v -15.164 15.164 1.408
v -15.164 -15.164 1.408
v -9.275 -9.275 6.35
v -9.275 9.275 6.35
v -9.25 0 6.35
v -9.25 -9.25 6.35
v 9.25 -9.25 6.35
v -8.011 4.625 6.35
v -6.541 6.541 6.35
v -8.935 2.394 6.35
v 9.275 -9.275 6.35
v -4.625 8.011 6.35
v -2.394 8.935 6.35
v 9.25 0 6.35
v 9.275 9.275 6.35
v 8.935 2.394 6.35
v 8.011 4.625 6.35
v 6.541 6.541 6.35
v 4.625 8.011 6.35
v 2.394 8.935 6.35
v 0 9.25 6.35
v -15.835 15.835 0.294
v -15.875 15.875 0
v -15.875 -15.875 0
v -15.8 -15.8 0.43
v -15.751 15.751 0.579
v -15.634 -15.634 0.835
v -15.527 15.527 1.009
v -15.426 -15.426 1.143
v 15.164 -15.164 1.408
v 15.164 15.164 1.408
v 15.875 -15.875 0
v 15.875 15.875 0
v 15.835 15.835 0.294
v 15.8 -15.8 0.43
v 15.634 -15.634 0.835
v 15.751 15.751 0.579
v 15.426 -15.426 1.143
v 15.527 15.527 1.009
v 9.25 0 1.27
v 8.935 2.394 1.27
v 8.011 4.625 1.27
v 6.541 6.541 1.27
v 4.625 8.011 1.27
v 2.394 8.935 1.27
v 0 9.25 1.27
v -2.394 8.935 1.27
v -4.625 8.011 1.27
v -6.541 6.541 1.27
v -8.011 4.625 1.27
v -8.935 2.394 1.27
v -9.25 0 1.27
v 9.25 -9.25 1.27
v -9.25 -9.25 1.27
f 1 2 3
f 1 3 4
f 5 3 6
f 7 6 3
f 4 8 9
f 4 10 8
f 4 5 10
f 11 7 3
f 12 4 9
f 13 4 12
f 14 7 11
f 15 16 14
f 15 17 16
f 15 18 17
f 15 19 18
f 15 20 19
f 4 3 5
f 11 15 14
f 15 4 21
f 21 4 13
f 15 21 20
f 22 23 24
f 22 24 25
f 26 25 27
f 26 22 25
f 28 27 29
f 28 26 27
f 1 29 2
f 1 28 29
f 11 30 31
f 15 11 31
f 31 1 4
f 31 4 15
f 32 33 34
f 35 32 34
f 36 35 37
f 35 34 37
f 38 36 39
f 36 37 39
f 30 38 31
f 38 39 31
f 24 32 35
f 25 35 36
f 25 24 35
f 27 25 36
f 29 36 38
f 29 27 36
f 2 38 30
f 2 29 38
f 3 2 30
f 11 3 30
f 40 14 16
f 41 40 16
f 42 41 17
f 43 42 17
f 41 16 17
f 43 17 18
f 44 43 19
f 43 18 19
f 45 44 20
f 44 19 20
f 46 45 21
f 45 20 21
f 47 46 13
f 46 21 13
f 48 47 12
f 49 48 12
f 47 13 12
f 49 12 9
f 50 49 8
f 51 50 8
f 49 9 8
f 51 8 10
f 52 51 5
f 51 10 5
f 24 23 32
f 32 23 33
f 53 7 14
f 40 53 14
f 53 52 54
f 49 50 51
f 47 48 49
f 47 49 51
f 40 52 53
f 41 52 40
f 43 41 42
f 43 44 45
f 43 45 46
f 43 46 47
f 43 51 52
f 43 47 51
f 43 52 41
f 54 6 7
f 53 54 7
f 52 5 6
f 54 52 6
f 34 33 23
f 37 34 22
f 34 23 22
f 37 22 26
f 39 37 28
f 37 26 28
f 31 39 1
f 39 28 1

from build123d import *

# Parameters (mm, degrees)
F0_W        = 31.75
F0_H        = 31.75
F1_DEPTH    = 6.35
F2_SIZE2    = 5.5380575658
F2_SIZE     = 6.6
F4_DEPTH    = 5.08
F5_T1_DEPTH = 36.3880046162
F5_T3_DEPTH = 36.3880046162


# Not quite as in the source:
# - a fillet or chamfer that OpenCascade refuses, or shapes differently, is made with other operations: its cross-section is extruded or revolved along the edge and cut away or added


with BuildPart() as f1:
    # F0 (on Top) → F1 (new body)
    with BuildSketch(Plane.XY):
        Rectangle(F0_W, F0_H)
    extrude(amount=F1_DEPTH)

    # F2
    f2_edges = [f1.edges().sort_by_distance(p)[0] for p in [
        (-15.875, 0, 6.35),
        (0, -15.875, 6.35),
        (15.875, 0, 6.35),
        (0, 15.875, 6.35),
    ]]
    f2_side = f1.faces().sort_by_distance((0, 0, 6.35))[0]
    chamfer(f2_edges, length=F2_SIZE, length2=F2_SIZE2, reference=f2_side)

    # F3 (on face) → F4 (cut)
    with BuildSketch(Plane.XY.offset(6.35)):
        with BuildLine():
            Line((9.25, -9.25), (9.25, 0))
            ThreePointArc((9.25, 0), (0, 9.25), (-9.25, 0))
            Line((-9.25, 0), (-9.25, -9.25))
            Line((-9.25, -9.25), (9.25, -9.25))
        make_face()
    extrude(amount=-F4_DEPTH, mode=Mode.SUBTRACT)

    # F5: fillet of radius 2 on 4 edges, made by hand

    # F5_s2 → F5_t1 (cut)
    with BuildSketch(Plane.YZ.offset(-18.1940023081)):
        with BuildLine():
            ThreePointArc((-15.875, 0), (-15.6643933238, 0.7771054734), (-15.1644164673, 1.4081928144))
            Line((-15.1644164673, 1.4081928144), (-15.875, 0.8119424342))
            Line((-15.875, 0.8119424342), (-15.875, 0))
        make_face()
        with BuildLine():
            ThreePointArc((15.875, 0), (15.6643933238, 0.7771054734), (15.1644164673, 1.4081928144))
            Line((15.1644164673, 1.4081928144), (15.875, 0.8119424342))
            Line((15.875, 0.8119424342), (15.875, 0))
        make_face()
    extrude(amount=F5_T1_DEPTH, mode=Mode.SUBTRACT)

    # F5_s4 → F5_t3 (cut)
    with BuildSketch(Plane.XZ.offset(-18.1940023081)):
        with BuildLine():
            ThreePointArc((15.875, 0), (15.6643933238, 0.7771054734), (15.1644164673, 1.4081928144))
            Line((15.1644164673, 1.4081928144), (15.875, 0.8119424342))
            Line((15.875, 0.8119424342), (15.875, 0))
        make_face()
        with BuildLine():
            ThreePointArc((-15.875, 0), (-15.6643933238, 0.7771054734), (-15.1644164673, 1.4081928144))
            Line((-15.1644164673, 1.4081928144), (-15.875, 0.8119424342))
            Line((-15.875, 0.8119424342), (-15.875, 0))
        make_face()
    extrude(amount=F5_T3_DEPTH, mode=Mode.SUBTRACT)


solid = f1.part
